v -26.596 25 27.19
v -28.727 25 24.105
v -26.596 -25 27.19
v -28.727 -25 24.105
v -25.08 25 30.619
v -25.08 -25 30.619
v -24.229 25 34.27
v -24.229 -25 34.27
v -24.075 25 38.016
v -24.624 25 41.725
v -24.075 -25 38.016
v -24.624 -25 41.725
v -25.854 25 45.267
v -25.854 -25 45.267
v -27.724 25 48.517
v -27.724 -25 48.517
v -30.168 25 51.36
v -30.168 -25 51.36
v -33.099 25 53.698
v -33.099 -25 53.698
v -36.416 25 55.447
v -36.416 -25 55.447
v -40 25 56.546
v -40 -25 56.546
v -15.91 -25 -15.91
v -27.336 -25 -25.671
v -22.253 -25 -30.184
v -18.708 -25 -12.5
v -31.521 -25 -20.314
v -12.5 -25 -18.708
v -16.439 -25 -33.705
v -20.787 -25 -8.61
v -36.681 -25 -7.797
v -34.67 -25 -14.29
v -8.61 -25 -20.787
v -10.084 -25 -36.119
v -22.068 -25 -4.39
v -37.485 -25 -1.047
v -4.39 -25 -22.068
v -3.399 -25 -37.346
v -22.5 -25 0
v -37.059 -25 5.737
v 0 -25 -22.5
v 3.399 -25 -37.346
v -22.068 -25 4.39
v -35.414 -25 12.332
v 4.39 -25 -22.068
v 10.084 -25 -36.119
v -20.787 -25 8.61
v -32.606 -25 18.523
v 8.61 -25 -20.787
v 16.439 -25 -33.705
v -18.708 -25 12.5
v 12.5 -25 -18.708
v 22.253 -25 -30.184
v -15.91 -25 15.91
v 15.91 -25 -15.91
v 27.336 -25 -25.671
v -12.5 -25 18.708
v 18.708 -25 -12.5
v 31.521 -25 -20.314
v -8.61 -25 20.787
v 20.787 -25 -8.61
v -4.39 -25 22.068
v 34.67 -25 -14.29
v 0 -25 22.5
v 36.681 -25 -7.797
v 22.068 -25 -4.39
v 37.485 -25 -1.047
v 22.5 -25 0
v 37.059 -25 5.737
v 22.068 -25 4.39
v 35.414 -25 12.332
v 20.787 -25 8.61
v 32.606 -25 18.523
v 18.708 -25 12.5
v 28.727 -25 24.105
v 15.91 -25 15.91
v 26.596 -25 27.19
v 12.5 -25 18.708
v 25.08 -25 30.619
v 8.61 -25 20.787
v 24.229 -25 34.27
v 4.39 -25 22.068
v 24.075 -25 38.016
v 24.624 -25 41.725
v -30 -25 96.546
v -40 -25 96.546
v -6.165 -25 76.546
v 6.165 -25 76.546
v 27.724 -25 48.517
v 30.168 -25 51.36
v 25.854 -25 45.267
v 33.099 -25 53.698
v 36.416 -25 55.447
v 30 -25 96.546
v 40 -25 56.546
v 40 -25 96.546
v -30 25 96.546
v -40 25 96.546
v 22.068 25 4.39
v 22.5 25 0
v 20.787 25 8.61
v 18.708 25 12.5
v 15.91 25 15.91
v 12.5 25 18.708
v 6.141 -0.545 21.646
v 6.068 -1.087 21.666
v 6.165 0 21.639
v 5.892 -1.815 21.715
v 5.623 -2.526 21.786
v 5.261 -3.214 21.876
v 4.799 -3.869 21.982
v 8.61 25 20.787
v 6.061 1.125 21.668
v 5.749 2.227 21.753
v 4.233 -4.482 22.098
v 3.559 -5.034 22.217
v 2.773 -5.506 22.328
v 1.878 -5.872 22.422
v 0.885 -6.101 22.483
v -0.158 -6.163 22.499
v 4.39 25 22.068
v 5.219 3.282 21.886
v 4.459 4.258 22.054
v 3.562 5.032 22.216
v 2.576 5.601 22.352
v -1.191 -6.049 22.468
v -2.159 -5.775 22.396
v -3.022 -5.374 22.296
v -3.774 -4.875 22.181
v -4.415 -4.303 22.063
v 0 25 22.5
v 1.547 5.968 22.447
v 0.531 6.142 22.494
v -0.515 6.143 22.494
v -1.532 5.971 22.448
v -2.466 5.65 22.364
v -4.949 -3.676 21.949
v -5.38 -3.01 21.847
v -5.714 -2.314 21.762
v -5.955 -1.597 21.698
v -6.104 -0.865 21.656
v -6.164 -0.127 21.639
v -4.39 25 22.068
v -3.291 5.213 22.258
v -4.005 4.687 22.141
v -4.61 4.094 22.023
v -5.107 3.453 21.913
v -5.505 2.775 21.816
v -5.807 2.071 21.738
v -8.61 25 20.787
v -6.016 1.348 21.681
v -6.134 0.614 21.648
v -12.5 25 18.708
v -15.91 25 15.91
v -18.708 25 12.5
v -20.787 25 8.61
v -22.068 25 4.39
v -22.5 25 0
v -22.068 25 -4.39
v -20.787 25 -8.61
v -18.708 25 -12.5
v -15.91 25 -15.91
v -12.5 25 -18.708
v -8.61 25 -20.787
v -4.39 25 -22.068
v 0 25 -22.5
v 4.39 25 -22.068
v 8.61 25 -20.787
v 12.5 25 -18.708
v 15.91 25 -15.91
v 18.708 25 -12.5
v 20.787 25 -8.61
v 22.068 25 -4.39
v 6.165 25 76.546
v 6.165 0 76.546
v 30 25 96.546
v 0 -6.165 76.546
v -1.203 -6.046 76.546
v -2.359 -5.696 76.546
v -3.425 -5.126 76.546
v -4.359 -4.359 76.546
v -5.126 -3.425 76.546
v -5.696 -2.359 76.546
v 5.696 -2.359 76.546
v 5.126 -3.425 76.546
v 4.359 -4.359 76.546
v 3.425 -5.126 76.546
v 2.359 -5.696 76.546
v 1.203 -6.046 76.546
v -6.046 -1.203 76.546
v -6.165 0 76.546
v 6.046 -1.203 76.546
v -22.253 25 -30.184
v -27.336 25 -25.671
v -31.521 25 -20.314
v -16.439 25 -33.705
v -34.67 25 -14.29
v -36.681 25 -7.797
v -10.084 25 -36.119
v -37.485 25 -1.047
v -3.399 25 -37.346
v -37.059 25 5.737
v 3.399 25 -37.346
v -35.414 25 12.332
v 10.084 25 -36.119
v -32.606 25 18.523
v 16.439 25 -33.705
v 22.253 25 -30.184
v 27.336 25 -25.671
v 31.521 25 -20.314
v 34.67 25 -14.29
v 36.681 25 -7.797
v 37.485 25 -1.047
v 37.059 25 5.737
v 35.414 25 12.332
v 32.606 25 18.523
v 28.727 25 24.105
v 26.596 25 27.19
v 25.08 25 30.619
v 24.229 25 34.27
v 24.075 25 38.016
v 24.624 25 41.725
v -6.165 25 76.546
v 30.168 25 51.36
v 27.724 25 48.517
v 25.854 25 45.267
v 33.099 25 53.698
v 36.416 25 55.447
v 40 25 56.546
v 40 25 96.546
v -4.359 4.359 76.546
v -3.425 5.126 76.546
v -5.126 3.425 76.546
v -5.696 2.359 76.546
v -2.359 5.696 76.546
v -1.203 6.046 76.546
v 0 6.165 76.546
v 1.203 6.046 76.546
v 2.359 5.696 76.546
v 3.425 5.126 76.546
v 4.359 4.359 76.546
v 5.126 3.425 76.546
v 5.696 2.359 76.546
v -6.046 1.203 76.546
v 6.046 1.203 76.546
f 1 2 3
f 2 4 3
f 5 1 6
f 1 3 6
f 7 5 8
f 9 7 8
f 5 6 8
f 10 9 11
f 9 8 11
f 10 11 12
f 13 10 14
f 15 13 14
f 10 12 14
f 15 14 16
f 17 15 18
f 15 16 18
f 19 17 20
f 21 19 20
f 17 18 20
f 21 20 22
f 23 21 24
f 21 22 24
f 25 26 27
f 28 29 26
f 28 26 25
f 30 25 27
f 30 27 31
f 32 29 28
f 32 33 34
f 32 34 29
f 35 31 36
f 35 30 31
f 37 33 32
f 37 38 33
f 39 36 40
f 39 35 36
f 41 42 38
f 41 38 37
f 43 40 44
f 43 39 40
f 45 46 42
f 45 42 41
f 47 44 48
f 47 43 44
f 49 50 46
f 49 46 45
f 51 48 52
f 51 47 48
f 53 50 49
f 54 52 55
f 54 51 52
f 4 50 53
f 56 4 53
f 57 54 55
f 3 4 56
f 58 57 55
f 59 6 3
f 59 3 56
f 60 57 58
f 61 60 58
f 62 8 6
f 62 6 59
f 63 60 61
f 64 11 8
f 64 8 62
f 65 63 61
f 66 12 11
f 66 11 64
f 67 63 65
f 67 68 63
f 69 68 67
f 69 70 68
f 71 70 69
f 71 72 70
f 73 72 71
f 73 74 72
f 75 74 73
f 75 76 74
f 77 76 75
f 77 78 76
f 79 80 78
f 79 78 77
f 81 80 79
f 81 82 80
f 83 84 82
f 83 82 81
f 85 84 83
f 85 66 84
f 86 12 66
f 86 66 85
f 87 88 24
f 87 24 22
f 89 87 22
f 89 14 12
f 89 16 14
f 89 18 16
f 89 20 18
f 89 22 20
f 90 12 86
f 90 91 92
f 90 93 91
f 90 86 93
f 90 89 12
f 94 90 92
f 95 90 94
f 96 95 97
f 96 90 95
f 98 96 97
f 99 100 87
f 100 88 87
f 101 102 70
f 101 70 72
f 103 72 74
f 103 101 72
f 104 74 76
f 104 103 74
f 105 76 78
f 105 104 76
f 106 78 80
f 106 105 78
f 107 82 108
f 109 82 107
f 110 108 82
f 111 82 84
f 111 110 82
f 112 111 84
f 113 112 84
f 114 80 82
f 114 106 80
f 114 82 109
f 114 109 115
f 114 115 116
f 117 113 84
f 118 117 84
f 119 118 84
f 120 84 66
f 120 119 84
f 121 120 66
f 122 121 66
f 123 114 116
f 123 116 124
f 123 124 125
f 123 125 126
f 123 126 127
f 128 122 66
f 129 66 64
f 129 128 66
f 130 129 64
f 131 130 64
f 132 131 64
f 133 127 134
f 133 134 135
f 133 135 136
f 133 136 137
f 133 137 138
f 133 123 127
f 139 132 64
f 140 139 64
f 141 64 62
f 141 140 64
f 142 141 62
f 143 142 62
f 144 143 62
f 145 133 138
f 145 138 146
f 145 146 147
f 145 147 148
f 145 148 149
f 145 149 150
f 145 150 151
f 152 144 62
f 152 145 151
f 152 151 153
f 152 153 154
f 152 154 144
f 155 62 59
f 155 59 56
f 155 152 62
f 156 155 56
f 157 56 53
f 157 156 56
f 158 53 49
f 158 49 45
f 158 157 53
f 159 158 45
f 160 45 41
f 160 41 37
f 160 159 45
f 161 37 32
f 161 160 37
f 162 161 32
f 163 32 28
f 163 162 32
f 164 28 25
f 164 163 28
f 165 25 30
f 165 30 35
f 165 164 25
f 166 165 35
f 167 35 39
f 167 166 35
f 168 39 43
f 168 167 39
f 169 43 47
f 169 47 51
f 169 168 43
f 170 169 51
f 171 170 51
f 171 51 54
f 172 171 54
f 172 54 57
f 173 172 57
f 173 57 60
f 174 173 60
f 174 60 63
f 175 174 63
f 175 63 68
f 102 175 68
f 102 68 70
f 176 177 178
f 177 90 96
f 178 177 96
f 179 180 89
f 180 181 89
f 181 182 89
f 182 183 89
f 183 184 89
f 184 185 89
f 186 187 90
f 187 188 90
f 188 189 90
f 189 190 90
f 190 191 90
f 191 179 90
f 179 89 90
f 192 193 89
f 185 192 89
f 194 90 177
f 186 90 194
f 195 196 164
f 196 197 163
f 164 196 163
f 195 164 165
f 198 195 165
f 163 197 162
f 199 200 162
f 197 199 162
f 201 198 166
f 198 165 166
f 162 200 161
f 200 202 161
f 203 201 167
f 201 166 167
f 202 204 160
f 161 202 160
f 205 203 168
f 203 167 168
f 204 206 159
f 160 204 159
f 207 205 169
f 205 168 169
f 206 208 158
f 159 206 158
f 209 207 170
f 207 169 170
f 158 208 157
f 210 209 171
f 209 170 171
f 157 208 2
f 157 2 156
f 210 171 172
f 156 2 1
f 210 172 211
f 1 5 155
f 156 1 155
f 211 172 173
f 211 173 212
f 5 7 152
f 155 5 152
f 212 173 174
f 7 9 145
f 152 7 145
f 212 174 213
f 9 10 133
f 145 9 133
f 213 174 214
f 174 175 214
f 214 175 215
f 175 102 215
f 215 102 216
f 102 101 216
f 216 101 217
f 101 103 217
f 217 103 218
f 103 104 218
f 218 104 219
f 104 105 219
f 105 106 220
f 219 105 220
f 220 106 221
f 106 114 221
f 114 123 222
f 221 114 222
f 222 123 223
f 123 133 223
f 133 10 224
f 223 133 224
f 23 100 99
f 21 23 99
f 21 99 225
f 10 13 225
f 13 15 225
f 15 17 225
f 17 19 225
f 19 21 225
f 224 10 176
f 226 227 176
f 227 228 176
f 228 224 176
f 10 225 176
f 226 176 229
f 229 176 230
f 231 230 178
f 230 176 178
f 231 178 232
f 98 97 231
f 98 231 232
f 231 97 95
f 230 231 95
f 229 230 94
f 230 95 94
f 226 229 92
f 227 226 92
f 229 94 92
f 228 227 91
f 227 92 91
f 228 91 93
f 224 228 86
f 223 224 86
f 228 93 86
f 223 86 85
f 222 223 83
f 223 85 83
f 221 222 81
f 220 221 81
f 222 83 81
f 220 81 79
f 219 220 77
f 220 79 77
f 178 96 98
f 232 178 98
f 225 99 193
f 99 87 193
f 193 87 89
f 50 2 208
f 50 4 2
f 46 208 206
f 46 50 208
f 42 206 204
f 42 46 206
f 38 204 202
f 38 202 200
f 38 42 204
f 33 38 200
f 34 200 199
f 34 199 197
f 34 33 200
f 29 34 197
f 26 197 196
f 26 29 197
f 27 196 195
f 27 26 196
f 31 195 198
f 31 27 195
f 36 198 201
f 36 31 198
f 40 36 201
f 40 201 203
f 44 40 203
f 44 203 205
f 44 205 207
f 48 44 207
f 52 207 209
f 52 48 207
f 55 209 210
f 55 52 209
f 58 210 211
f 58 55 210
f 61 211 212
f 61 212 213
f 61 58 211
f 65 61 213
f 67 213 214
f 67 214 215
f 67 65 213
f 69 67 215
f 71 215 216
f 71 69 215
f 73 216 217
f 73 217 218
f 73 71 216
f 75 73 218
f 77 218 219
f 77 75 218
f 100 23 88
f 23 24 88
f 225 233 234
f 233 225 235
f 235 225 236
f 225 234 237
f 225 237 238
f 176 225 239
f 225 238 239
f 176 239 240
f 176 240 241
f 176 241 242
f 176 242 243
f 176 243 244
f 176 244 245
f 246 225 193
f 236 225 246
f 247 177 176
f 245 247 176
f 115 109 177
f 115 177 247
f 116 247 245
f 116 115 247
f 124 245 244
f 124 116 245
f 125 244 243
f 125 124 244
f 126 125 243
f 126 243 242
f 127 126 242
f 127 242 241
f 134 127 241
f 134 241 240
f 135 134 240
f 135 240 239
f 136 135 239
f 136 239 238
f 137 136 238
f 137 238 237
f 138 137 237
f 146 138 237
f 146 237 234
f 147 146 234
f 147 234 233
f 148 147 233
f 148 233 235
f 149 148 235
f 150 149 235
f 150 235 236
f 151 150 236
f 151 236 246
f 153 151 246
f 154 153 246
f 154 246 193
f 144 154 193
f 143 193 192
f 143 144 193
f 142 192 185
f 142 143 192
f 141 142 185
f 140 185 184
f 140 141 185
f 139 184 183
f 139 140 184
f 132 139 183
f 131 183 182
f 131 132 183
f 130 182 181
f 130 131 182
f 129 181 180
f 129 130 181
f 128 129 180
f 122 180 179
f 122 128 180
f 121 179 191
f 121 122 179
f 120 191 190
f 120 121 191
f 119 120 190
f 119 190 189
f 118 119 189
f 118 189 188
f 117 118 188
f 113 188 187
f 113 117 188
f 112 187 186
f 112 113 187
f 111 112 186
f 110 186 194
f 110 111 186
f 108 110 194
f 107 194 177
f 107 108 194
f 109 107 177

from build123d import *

# Parameters (mm, degrees)
SKETCH_R     = 22.5
PAD_DEPTH    = 25
SKETCH001_R  = 6.164928
POCKET_DEPTH = 96.547437


with BuildPart() as part:
    # Sketch → Pad (new body, symmetric)
    with BuildSketch(Plane.XZ):
        with BuildLine():
            ThreePointArc((-28.726667, 24.104535), (0, -37.5), (28.726667, 24.104535))
            ThreePointArc((40, 56.546437), (25.155668, 43.525085), (28.726667, 24.104535))
            Line((40, 56.546437), (40, 96.546437))
            Line((30, 96.546437), (40, 96.546437))
            Line((6.164928, 76.546437), (30, 96.546437))
            Line((-6.164928, 76.546437), (6.164928, 76.546437))
            Line((-30, 96.546437), (-6.164928, 76.546437))
            Line((-40, 96.546437), (-30, 96.546437))
            Line((-40, 56.546437), (-40, 96.546437))
            ThreePointArc((-28.726667, 24.104535), (-25.155668, 43.525085), (-40, 56.546437))
        make_face()
        Circle(SKETCH_R, mode=Mode.SUBTRACT)
    extrude(amount=PAD_DEPTH, both=True)

    # Sketch001 → Pocket (cut, through all)
    with BuildSketch(Plane.XY):
        Circle(SKETCH001_R)
    extrude(amount=POCKET_DEPTH, mode=Mode.SUBTRACT)


solid = part.part
